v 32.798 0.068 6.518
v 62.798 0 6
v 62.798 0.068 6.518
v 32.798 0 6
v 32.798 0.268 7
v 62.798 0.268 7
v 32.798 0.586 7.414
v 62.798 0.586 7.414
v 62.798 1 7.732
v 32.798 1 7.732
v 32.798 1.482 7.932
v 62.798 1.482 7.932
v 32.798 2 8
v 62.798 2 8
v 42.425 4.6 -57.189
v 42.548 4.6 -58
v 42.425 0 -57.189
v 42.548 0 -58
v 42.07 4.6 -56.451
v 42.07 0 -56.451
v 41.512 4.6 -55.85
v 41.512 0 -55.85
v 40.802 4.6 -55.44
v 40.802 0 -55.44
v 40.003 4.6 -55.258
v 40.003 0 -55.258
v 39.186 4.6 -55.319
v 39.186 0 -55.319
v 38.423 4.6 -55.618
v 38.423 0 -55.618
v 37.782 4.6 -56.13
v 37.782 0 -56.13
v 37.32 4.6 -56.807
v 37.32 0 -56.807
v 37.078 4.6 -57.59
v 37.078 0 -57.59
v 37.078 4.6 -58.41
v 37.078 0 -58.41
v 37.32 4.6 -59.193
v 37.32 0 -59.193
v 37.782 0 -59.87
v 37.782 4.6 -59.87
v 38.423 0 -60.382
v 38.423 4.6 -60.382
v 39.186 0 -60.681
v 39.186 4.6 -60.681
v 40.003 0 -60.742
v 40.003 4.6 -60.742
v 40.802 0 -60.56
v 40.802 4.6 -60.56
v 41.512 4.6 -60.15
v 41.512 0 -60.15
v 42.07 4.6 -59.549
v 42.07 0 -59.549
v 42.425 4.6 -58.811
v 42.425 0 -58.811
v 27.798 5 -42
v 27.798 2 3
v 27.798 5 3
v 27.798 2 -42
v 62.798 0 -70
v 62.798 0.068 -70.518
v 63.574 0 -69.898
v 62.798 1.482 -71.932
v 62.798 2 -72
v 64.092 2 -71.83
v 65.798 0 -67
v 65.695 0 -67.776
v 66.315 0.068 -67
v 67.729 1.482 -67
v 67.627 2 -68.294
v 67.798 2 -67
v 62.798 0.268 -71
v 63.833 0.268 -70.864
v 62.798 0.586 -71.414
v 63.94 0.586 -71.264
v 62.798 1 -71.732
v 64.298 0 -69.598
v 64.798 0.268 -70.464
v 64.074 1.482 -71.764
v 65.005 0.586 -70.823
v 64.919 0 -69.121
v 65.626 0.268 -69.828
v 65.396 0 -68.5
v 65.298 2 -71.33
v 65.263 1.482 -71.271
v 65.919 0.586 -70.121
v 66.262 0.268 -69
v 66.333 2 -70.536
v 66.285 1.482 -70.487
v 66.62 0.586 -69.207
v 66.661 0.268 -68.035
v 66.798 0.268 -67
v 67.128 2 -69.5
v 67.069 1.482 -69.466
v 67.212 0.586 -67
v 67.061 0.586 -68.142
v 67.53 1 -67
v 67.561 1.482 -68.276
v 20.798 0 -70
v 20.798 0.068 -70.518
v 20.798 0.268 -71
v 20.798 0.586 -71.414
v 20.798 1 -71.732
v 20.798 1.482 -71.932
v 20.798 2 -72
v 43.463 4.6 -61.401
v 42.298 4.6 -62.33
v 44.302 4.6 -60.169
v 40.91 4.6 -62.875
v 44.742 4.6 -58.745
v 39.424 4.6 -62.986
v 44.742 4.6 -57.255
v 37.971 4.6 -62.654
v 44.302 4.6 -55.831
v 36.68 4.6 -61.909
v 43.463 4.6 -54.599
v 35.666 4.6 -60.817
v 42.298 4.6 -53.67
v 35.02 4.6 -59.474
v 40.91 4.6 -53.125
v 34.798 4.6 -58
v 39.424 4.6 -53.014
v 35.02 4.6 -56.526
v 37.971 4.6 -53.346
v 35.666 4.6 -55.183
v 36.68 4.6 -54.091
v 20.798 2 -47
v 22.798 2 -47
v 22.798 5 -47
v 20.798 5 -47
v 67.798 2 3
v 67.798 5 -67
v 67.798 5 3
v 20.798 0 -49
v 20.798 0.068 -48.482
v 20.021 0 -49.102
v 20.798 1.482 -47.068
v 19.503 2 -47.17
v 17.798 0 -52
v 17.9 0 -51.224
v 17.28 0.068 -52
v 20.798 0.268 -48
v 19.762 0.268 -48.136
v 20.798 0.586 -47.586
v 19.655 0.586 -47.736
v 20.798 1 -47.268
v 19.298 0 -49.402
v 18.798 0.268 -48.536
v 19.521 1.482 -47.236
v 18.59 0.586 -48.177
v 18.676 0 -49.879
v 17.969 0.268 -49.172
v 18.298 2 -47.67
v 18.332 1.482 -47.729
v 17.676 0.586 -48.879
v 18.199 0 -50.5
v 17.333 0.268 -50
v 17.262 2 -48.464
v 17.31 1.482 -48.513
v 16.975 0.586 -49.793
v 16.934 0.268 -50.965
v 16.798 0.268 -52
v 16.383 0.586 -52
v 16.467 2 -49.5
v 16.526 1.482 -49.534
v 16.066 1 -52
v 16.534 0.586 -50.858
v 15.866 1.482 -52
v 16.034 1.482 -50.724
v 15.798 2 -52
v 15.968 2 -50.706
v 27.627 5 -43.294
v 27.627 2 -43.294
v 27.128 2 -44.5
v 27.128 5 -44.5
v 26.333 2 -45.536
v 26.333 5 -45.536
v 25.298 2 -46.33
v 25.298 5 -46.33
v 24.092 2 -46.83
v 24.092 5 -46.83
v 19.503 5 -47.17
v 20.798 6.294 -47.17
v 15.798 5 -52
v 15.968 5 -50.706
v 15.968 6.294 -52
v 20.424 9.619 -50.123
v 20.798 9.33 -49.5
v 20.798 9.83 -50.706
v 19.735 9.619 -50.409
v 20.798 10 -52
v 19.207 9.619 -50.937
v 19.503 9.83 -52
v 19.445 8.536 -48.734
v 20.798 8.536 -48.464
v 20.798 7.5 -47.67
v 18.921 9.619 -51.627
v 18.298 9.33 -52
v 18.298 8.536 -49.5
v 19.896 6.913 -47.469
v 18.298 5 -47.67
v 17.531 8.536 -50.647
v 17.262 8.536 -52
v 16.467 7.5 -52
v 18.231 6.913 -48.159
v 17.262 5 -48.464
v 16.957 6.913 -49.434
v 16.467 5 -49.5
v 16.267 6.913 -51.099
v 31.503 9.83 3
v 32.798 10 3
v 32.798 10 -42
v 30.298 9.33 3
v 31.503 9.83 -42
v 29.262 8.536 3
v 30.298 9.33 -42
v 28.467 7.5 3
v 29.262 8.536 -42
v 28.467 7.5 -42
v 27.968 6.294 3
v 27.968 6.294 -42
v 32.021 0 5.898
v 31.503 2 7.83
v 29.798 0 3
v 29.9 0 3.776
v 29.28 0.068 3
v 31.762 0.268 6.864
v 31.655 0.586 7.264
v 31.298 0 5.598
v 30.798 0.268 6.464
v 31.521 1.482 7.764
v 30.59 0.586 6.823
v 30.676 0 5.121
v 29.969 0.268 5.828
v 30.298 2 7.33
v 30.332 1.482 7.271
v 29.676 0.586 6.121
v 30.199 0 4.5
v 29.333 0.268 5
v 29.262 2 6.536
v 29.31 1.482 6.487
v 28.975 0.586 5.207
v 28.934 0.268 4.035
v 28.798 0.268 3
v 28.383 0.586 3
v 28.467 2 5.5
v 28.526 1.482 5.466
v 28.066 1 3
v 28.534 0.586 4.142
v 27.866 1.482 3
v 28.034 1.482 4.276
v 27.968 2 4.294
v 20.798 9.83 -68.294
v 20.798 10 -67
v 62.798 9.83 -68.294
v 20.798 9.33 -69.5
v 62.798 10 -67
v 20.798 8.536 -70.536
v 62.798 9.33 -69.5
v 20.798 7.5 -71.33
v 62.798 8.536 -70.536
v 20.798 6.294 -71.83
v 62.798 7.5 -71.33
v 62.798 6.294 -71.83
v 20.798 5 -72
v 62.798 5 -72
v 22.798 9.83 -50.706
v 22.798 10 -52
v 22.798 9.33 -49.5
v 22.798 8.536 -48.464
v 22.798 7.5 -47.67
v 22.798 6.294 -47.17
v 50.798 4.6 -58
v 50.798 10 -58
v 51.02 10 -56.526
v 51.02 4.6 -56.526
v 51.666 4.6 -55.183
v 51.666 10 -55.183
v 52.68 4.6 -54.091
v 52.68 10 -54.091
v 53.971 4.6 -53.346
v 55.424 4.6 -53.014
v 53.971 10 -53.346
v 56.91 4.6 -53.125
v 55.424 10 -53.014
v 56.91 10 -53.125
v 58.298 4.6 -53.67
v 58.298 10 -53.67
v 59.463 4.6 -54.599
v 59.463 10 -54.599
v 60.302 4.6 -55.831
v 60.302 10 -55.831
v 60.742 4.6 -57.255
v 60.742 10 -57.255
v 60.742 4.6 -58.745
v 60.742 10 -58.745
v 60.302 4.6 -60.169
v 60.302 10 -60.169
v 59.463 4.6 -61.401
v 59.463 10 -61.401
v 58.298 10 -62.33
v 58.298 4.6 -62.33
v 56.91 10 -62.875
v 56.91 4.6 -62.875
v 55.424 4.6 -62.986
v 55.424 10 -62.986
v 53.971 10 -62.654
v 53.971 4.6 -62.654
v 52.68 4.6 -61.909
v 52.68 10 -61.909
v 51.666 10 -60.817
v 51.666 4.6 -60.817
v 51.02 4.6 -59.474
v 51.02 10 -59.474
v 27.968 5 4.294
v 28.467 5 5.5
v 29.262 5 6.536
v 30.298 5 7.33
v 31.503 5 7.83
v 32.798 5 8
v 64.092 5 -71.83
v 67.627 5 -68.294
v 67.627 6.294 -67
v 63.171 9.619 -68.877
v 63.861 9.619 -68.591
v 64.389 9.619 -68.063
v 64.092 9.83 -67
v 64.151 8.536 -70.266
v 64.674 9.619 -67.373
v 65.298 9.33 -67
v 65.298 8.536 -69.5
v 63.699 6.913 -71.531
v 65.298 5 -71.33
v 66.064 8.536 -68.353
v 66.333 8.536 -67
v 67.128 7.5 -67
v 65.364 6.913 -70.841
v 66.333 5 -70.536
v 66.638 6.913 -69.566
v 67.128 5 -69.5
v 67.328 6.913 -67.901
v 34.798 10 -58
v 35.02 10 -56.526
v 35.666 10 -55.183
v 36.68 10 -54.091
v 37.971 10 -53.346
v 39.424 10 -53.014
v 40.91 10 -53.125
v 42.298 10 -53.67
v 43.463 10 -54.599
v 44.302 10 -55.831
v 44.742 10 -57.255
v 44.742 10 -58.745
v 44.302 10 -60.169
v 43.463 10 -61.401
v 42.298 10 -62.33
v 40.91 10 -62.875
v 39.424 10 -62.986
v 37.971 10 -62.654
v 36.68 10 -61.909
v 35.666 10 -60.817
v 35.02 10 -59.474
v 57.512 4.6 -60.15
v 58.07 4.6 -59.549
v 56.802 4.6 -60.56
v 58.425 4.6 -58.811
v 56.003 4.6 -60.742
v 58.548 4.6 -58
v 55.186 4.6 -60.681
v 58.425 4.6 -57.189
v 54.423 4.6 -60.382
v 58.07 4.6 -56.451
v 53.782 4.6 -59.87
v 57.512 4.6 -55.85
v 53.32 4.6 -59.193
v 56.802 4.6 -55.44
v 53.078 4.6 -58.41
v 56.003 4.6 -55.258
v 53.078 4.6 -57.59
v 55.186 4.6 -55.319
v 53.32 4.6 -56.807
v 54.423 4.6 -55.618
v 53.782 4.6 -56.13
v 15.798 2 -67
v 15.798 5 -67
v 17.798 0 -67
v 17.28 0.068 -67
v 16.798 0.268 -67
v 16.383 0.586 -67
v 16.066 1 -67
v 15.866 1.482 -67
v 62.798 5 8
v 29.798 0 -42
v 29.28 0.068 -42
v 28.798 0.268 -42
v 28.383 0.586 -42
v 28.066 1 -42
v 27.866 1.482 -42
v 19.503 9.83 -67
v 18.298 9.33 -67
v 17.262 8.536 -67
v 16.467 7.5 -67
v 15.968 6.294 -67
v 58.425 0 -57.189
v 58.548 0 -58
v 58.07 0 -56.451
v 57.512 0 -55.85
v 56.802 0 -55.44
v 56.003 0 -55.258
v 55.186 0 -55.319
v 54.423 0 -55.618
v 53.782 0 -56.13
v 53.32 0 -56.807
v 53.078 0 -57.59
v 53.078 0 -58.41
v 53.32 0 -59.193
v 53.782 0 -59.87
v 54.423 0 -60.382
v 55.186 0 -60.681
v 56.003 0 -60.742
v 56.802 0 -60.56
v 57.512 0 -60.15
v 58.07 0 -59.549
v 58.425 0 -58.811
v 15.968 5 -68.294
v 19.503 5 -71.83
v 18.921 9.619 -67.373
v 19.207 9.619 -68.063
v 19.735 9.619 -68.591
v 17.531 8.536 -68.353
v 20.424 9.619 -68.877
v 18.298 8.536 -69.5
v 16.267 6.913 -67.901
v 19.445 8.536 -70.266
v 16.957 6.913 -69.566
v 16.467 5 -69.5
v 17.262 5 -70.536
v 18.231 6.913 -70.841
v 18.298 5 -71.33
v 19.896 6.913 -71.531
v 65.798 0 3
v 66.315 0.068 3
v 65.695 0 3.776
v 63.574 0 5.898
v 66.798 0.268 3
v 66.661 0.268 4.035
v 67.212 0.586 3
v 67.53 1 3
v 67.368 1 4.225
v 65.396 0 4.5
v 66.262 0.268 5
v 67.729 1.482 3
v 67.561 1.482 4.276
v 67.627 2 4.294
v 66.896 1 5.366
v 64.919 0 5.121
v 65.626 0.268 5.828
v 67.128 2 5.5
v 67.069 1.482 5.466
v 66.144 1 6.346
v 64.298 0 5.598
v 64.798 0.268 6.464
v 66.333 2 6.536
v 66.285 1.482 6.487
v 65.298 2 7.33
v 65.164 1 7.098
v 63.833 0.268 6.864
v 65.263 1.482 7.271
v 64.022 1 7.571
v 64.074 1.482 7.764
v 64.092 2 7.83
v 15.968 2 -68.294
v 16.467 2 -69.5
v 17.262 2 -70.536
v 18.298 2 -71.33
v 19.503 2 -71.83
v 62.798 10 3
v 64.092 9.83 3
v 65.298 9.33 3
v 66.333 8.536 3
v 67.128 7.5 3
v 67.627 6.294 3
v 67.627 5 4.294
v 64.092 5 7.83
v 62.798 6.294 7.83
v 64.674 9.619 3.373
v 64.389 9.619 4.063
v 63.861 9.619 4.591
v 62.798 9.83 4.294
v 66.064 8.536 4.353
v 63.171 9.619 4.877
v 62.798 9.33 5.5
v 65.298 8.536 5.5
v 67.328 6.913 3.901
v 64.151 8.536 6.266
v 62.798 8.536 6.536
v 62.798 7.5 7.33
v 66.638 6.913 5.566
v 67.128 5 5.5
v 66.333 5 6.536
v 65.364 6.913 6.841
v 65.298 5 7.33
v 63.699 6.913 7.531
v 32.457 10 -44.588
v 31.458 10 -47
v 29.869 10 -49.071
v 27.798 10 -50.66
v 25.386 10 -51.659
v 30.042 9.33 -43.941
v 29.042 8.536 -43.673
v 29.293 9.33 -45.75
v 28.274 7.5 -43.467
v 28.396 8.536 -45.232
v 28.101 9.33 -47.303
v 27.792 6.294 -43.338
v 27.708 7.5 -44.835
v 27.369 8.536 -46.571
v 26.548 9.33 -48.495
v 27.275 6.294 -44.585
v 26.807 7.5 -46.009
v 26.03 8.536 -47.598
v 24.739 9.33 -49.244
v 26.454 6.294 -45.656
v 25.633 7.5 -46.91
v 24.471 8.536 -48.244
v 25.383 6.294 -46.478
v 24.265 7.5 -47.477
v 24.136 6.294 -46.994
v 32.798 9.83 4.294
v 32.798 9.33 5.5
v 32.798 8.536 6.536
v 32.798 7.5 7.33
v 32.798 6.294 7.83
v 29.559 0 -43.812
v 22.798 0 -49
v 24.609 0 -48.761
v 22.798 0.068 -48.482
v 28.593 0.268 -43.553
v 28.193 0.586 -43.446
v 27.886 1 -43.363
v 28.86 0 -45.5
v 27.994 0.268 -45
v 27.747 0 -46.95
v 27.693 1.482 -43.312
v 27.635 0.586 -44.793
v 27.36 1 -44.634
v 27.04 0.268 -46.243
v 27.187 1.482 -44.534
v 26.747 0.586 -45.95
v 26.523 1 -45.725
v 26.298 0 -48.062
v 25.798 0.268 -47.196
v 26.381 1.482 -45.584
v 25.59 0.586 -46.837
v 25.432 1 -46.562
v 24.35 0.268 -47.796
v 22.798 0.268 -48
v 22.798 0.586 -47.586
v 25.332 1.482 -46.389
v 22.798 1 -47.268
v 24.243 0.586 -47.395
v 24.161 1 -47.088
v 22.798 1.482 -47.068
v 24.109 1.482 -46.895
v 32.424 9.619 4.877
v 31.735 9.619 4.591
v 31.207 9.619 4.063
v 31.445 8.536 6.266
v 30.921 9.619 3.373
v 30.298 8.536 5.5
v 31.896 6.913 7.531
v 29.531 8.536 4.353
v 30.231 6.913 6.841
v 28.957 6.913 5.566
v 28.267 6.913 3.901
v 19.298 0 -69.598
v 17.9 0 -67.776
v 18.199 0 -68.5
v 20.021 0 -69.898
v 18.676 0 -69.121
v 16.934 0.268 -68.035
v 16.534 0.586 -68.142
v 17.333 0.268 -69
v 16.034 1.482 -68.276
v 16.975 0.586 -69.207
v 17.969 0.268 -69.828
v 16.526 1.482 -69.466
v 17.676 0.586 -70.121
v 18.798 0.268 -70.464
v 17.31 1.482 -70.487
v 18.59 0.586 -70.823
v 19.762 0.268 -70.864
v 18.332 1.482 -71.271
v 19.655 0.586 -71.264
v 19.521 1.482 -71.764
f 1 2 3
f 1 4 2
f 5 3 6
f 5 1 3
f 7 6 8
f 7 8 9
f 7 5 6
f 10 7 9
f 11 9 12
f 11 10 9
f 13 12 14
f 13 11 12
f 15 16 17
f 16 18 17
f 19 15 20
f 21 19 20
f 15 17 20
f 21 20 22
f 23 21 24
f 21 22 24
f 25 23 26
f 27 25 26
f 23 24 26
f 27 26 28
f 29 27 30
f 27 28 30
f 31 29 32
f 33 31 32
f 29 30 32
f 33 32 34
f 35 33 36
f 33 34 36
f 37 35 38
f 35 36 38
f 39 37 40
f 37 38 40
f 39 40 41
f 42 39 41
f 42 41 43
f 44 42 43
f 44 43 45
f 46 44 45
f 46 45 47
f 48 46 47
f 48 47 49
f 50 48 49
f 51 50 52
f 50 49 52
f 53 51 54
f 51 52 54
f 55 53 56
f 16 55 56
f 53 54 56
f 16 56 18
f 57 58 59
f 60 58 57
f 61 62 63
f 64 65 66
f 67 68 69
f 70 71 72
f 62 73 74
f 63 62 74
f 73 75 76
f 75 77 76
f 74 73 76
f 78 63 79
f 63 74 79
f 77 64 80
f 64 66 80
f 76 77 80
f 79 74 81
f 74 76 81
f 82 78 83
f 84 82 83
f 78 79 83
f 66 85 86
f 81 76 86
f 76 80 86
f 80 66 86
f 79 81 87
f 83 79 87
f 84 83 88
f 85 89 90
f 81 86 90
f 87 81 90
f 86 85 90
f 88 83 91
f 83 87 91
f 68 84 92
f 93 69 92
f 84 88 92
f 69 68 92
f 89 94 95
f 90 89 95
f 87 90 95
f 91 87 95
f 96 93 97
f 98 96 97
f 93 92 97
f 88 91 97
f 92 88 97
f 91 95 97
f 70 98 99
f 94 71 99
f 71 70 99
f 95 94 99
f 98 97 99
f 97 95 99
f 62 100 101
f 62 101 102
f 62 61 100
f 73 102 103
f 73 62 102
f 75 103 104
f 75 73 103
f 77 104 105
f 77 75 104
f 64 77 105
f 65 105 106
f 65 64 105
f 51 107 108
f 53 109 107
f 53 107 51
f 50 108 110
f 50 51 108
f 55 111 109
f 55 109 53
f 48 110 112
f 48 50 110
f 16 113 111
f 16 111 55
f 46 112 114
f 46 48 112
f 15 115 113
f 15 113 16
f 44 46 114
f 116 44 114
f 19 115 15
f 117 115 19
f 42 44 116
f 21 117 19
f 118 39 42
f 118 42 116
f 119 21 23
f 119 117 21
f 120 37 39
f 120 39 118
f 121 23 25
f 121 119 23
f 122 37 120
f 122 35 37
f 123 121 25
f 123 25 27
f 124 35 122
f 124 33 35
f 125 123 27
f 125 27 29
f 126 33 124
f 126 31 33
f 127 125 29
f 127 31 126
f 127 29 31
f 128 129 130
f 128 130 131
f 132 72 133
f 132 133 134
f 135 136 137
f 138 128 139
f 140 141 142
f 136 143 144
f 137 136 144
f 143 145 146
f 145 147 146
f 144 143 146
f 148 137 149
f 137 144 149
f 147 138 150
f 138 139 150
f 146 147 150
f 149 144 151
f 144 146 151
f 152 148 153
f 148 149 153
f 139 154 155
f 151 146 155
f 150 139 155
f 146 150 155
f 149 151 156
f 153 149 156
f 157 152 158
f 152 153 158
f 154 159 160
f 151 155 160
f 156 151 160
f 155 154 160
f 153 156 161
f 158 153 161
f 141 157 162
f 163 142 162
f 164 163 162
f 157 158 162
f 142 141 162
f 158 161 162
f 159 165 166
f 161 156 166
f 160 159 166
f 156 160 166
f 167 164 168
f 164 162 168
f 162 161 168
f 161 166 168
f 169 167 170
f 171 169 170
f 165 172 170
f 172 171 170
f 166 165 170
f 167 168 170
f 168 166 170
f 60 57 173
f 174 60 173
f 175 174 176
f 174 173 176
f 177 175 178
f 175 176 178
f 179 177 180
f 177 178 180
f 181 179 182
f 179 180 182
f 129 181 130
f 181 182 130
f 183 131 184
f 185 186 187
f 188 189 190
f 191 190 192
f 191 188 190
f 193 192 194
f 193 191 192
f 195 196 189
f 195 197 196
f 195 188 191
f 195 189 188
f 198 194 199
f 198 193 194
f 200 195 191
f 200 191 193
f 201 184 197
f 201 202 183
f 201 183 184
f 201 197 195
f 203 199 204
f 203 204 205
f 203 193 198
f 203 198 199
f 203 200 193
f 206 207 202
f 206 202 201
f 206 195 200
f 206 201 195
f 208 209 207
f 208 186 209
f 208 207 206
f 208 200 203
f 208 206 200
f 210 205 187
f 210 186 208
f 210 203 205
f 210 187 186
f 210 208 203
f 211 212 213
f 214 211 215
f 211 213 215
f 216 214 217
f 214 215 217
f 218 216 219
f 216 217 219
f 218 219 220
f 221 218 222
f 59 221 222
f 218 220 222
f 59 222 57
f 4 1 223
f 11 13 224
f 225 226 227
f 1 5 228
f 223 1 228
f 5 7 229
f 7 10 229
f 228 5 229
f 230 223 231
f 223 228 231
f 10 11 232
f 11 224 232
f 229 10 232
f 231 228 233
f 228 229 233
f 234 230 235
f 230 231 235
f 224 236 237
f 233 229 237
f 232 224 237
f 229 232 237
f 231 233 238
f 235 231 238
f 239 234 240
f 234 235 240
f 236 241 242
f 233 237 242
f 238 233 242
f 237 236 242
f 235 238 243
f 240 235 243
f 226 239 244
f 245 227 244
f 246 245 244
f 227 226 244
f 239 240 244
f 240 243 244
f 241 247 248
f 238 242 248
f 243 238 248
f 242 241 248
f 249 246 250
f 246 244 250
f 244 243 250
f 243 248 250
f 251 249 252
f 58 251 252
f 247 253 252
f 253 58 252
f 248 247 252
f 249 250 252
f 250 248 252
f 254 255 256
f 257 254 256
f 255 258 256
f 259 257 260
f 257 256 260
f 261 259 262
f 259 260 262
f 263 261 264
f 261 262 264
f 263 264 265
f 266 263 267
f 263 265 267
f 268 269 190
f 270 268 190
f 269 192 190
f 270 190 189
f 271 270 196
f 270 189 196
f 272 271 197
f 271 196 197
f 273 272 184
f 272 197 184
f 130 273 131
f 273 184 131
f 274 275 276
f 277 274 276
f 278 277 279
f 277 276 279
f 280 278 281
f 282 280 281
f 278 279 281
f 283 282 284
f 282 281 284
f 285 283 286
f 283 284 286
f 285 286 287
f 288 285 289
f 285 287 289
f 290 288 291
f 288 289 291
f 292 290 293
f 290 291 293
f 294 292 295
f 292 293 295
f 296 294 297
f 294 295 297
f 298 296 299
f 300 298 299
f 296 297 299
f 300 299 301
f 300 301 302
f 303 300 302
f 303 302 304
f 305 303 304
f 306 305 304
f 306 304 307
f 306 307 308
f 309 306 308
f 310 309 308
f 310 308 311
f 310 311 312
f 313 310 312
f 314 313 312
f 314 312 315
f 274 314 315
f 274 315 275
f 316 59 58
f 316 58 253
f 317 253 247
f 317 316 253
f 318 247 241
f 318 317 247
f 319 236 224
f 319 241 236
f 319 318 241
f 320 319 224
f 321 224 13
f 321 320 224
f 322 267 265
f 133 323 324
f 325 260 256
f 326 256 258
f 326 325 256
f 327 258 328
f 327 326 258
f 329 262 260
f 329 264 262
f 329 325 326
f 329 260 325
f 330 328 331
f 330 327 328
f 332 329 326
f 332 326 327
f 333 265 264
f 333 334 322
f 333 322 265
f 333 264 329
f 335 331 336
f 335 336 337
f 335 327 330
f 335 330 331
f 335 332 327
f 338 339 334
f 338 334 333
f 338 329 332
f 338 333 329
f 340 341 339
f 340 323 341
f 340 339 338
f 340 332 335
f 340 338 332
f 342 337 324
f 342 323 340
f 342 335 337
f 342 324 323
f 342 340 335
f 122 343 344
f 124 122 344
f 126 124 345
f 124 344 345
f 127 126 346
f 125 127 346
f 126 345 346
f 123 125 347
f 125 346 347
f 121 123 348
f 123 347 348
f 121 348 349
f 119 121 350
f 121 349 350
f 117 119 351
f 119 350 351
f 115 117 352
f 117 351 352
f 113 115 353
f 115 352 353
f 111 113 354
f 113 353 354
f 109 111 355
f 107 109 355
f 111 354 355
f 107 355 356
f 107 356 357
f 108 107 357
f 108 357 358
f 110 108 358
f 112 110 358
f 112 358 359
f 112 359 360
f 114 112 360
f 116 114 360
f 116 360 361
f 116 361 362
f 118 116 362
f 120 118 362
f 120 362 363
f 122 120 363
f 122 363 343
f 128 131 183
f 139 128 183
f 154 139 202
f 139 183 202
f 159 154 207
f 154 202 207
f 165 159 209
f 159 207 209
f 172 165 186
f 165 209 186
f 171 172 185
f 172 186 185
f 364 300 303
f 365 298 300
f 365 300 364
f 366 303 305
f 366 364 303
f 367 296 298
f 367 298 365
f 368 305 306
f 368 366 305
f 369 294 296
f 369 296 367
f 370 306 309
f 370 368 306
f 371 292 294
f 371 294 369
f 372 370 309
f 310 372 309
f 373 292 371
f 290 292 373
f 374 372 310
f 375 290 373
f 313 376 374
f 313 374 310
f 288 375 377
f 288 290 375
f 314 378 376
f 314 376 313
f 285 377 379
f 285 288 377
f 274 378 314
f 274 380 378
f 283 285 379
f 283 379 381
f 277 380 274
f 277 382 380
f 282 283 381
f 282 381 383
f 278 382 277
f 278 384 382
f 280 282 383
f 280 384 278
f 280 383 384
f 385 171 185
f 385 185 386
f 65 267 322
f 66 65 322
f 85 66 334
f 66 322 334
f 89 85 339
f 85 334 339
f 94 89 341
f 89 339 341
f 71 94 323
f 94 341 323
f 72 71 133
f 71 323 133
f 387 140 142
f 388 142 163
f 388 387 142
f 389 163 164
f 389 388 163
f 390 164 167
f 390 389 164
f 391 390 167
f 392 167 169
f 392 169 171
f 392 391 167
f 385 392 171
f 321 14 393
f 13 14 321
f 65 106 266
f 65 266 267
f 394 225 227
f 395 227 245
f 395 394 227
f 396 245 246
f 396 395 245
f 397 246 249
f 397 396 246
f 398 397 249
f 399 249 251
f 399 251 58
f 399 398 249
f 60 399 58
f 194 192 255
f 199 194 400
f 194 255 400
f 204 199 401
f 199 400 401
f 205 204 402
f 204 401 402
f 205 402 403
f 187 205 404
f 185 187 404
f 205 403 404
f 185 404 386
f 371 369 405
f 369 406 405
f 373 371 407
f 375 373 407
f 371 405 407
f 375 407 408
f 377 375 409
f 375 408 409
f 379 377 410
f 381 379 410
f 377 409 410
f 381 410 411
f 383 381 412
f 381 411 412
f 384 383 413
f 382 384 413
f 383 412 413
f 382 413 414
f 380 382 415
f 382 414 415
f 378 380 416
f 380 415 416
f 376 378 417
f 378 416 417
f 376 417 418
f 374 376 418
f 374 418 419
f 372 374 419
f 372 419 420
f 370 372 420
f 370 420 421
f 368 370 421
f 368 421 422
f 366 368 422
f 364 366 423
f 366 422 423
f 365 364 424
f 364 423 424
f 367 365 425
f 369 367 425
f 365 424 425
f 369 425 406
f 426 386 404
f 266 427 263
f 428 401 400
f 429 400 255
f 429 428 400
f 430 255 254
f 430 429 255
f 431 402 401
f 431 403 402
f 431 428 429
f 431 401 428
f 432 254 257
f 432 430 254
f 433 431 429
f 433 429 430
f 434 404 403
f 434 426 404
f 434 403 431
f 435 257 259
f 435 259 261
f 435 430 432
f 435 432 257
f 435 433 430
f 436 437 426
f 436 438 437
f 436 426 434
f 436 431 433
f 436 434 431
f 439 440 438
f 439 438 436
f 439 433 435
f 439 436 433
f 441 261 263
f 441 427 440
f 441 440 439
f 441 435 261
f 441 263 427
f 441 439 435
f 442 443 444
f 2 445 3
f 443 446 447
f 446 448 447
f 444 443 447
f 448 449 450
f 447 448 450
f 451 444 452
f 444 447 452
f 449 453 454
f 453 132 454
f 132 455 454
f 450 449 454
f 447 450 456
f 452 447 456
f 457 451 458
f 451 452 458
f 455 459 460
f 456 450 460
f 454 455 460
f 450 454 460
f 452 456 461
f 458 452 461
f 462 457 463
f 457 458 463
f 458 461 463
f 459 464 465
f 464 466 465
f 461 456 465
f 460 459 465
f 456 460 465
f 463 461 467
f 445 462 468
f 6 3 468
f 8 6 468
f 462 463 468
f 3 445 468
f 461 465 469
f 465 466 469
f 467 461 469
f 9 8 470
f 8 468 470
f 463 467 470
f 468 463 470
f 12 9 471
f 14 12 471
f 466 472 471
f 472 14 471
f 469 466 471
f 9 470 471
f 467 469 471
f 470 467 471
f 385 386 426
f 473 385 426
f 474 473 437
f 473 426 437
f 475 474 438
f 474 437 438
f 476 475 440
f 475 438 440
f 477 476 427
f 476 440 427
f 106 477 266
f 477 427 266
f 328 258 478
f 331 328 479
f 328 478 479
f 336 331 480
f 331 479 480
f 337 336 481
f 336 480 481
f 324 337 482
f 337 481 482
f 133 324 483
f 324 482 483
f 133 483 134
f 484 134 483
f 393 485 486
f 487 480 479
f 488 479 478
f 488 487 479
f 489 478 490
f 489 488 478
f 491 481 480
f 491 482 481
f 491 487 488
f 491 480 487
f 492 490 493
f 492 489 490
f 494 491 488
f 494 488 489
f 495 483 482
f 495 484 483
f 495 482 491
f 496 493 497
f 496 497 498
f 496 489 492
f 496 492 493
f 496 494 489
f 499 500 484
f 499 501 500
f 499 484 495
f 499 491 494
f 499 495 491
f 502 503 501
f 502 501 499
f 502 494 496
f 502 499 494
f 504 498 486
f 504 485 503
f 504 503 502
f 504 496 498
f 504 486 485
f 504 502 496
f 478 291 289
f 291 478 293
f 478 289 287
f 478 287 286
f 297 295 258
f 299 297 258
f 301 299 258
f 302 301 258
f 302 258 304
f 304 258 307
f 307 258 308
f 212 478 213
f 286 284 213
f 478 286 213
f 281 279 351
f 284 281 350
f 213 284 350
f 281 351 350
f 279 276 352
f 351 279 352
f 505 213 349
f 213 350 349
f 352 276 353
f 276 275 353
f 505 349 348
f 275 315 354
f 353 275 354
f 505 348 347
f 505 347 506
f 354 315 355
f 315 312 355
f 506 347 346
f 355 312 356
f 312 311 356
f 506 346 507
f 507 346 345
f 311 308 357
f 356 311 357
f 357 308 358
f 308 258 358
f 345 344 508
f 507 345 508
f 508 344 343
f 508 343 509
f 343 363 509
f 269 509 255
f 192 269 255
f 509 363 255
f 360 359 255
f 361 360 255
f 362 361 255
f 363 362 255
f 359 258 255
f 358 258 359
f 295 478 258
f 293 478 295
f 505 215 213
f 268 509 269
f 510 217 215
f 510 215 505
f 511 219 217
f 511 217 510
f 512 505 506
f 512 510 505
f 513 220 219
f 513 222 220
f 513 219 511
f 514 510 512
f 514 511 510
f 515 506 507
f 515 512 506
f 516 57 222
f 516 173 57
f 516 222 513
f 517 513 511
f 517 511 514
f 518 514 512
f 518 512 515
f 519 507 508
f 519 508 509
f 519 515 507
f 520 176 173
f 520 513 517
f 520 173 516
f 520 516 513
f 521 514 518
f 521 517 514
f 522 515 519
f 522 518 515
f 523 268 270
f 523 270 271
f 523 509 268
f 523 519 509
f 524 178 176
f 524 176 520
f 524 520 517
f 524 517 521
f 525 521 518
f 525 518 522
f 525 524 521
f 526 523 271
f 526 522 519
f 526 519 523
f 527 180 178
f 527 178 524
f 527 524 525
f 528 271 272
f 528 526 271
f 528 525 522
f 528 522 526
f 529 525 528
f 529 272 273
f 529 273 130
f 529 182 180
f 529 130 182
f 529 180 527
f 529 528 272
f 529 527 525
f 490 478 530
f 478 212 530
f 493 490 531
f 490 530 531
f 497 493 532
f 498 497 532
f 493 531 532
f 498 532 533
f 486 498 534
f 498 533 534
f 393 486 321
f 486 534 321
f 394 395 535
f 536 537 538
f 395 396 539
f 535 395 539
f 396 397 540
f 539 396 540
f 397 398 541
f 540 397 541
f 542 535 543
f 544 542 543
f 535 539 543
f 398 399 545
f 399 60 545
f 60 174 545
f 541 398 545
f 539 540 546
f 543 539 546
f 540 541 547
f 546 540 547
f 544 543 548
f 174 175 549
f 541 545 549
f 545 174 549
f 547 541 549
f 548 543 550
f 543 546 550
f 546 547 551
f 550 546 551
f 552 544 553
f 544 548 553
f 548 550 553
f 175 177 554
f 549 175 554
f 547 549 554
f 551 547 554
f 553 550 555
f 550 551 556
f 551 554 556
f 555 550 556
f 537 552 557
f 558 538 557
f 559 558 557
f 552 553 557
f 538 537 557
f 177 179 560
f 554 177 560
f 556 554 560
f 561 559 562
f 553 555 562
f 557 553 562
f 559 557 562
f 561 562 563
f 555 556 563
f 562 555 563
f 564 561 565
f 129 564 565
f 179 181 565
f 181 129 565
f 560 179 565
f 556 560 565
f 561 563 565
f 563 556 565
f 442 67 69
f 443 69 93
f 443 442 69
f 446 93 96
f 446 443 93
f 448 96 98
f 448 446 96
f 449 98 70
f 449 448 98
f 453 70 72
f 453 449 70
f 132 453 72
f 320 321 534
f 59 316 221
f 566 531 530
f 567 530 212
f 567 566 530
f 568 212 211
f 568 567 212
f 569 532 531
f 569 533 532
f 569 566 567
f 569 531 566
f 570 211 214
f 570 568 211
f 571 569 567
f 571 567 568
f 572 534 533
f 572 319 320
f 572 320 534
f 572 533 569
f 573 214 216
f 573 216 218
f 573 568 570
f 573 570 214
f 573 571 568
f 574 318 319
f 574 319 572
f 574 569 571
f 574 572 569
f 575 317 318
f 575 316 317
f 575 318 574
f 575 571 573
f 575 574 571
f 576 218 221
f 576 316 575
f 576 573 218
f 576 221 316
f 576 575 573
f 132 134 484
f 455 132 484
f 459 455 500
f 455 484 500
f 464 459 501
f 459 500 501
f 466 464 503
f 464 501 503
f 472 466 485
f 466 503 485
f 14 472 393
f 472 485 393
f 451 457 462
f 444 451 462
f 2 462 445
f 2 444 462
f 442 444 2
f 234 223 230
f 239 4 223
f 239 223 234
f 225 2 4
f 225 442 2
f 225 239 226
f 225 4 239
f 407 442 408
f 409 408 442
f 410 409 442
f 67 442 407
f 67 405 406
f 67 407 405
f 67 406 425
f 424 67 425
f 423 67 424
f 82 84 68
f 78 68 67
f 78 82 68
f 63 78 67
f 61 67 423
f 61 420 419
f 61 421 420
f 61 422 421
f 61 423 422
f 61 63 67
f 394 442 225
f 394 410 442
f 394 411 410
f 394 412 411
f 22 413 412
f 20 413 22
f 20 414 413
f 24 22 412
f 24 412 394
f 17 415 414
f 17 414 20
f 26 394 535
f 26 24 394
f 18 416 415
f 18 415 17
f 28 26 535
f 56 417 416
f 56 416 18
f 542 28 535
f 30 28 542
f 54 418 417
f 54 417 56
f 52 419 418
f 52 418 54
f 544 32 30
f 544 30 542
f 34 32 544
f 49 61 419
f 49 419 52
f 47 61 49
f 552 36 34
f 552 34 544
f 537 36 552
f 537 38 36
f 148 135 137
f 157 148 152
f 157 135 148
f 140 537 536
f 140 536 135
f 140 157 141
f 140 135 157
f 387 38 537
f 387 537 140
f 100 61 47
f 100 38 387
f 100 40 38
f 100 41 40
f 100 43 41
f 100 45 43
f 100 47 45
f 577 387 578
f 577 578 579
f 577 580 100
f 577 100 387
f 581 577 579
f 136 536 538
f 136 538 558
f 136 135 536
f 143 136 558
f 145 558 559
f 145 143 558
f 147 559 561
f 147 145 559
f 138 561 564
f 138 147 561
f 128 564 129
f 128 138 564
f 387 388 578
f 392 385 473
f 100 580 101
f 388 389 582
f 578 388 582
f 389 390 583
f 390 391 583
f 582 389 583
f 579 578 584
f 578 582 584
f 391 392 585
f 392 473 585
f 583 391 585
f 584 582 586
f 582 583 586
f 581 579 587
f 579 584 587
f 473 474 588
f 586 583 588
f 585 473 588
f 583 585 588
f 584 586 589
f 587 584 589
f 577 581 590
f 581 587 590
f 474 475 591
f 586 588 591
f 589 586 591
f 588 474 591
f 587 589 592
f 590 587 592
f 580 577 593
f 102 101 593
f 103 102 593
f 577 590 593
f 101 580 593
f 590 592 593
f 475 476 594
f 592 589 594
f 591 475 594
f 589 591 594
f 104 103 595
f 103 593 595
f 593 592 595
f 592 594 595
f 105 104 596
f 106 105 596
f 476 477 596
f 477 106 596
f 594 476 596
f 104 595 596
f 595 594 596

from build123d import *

# Parameters (mm, degrees)
SALIENTE_EXTRUIR1_DEPTH         = 10
REDONDEO2_R                     = 5
REDONDEO3_R                     = 5
REDONDEO5_R                     = 2
TALADRO_ROSCADO_M51_D           = 5.5
TALADRO_ROSCADO_M51_CBORE_D     = 10
TALADRO_ROSCADO_M51_CBORE_DEPTH = 5.4


with BuildPart() as part:
    # Croquis1 → Saliente-Extruir1 (new body)
    with BuildSketch(Plane(origin=(0, 0, 0), x_dir=(1, 0, 0), z_dir=(0, 1, 0))):
        Polygon((27.79756746, -8), (27.79756746, 47), (15.79756746, 47), (15.79756746, 72), (67.79756746, 72), (67.79756746, -8), align=None)
    extrude(amount=SALIENTE_EXTRUIR1_DEPTH)

    # Redondeo2
    redondeo2_edges = [part.edges().sort_by_distance(p)[0] for p in [
        (15.79756746, 5, -72),
        (67.79756746, 5, -72),
        (67.79756746, 5, 8),
        (27.79756746, 5, 8),
        (27.79756746, 5, -47),
        (15.79756746, 5, -47),
    ]]
    fillet(redondeo2_edges, radius=REDONDEO2_R)

    # Redondeo3
    redondeo3_edges = [part.edges().sort_by_distance(p)[0] for p in [
        (47.79756746, 10, 8),
        (27.79756746, 10, -19.5),
        (15.79756746, 10, -59.5),
        (21.79756746, 10, -47),
        (67.79756746, 10, -32),
        (41.79756746, 10, -72),
        (17.262033554, 10, -48.464466094),
        (66.333101366, 10, 6.535533906),
        (66.333101366, 10, -70.535533906),
        (17.262033554, 10, -70.535533906),
        (29.262033554, 10, 6.535533906),
        (26.333101366, 10, -45.535533906),
    ]]
    fillet(redondeo3_edges, radius=REDONDEO3_R)

    # Redondeo5
    redondeo5_edges = [part.edges().sort_by_distance(p)[0] for p in [
        (47.79756746, 0, 8),
        (15.79756746, 0, -59.5),
        (41.79756746, 0, -72),
        (67.79756746, 0, -32),
        (27.79756746, 0, -19.5),
        (21.79756746, 0, -47),
        (17.262033554, 0, -48.464466094),
        (66.333101366, 0, 6.535533906),
        (66.333101366, 0, -70.535533906),
        (17.262033554, 0, -70.535533906),
        (29.262033554, 0, 6.535533906),
        (26.333101366, 0, -45.535533906),
    ]]
    fillet(redondeo5_edges, radius=REDONDEO5_R)

    # Taladro roscado M51 (through all)
    with Locations(Plane(origin=(-0.50897812, 10, 14.967559644), x_dir=(-1, 0, 0), z_dir=(0, 1, 0))):
        with Locations((-56.30654558, -72.967559644), (-40.30654558, -72.967559644)):
            CounterBoreHole(TALADRO_ROSCADO_M51_D / 2, TALADRO_ROSCADO_M51_CBORE_D / 2, TALADRO_ROSCADO_M51_CBORE_DEPTH)


solid = part.part
